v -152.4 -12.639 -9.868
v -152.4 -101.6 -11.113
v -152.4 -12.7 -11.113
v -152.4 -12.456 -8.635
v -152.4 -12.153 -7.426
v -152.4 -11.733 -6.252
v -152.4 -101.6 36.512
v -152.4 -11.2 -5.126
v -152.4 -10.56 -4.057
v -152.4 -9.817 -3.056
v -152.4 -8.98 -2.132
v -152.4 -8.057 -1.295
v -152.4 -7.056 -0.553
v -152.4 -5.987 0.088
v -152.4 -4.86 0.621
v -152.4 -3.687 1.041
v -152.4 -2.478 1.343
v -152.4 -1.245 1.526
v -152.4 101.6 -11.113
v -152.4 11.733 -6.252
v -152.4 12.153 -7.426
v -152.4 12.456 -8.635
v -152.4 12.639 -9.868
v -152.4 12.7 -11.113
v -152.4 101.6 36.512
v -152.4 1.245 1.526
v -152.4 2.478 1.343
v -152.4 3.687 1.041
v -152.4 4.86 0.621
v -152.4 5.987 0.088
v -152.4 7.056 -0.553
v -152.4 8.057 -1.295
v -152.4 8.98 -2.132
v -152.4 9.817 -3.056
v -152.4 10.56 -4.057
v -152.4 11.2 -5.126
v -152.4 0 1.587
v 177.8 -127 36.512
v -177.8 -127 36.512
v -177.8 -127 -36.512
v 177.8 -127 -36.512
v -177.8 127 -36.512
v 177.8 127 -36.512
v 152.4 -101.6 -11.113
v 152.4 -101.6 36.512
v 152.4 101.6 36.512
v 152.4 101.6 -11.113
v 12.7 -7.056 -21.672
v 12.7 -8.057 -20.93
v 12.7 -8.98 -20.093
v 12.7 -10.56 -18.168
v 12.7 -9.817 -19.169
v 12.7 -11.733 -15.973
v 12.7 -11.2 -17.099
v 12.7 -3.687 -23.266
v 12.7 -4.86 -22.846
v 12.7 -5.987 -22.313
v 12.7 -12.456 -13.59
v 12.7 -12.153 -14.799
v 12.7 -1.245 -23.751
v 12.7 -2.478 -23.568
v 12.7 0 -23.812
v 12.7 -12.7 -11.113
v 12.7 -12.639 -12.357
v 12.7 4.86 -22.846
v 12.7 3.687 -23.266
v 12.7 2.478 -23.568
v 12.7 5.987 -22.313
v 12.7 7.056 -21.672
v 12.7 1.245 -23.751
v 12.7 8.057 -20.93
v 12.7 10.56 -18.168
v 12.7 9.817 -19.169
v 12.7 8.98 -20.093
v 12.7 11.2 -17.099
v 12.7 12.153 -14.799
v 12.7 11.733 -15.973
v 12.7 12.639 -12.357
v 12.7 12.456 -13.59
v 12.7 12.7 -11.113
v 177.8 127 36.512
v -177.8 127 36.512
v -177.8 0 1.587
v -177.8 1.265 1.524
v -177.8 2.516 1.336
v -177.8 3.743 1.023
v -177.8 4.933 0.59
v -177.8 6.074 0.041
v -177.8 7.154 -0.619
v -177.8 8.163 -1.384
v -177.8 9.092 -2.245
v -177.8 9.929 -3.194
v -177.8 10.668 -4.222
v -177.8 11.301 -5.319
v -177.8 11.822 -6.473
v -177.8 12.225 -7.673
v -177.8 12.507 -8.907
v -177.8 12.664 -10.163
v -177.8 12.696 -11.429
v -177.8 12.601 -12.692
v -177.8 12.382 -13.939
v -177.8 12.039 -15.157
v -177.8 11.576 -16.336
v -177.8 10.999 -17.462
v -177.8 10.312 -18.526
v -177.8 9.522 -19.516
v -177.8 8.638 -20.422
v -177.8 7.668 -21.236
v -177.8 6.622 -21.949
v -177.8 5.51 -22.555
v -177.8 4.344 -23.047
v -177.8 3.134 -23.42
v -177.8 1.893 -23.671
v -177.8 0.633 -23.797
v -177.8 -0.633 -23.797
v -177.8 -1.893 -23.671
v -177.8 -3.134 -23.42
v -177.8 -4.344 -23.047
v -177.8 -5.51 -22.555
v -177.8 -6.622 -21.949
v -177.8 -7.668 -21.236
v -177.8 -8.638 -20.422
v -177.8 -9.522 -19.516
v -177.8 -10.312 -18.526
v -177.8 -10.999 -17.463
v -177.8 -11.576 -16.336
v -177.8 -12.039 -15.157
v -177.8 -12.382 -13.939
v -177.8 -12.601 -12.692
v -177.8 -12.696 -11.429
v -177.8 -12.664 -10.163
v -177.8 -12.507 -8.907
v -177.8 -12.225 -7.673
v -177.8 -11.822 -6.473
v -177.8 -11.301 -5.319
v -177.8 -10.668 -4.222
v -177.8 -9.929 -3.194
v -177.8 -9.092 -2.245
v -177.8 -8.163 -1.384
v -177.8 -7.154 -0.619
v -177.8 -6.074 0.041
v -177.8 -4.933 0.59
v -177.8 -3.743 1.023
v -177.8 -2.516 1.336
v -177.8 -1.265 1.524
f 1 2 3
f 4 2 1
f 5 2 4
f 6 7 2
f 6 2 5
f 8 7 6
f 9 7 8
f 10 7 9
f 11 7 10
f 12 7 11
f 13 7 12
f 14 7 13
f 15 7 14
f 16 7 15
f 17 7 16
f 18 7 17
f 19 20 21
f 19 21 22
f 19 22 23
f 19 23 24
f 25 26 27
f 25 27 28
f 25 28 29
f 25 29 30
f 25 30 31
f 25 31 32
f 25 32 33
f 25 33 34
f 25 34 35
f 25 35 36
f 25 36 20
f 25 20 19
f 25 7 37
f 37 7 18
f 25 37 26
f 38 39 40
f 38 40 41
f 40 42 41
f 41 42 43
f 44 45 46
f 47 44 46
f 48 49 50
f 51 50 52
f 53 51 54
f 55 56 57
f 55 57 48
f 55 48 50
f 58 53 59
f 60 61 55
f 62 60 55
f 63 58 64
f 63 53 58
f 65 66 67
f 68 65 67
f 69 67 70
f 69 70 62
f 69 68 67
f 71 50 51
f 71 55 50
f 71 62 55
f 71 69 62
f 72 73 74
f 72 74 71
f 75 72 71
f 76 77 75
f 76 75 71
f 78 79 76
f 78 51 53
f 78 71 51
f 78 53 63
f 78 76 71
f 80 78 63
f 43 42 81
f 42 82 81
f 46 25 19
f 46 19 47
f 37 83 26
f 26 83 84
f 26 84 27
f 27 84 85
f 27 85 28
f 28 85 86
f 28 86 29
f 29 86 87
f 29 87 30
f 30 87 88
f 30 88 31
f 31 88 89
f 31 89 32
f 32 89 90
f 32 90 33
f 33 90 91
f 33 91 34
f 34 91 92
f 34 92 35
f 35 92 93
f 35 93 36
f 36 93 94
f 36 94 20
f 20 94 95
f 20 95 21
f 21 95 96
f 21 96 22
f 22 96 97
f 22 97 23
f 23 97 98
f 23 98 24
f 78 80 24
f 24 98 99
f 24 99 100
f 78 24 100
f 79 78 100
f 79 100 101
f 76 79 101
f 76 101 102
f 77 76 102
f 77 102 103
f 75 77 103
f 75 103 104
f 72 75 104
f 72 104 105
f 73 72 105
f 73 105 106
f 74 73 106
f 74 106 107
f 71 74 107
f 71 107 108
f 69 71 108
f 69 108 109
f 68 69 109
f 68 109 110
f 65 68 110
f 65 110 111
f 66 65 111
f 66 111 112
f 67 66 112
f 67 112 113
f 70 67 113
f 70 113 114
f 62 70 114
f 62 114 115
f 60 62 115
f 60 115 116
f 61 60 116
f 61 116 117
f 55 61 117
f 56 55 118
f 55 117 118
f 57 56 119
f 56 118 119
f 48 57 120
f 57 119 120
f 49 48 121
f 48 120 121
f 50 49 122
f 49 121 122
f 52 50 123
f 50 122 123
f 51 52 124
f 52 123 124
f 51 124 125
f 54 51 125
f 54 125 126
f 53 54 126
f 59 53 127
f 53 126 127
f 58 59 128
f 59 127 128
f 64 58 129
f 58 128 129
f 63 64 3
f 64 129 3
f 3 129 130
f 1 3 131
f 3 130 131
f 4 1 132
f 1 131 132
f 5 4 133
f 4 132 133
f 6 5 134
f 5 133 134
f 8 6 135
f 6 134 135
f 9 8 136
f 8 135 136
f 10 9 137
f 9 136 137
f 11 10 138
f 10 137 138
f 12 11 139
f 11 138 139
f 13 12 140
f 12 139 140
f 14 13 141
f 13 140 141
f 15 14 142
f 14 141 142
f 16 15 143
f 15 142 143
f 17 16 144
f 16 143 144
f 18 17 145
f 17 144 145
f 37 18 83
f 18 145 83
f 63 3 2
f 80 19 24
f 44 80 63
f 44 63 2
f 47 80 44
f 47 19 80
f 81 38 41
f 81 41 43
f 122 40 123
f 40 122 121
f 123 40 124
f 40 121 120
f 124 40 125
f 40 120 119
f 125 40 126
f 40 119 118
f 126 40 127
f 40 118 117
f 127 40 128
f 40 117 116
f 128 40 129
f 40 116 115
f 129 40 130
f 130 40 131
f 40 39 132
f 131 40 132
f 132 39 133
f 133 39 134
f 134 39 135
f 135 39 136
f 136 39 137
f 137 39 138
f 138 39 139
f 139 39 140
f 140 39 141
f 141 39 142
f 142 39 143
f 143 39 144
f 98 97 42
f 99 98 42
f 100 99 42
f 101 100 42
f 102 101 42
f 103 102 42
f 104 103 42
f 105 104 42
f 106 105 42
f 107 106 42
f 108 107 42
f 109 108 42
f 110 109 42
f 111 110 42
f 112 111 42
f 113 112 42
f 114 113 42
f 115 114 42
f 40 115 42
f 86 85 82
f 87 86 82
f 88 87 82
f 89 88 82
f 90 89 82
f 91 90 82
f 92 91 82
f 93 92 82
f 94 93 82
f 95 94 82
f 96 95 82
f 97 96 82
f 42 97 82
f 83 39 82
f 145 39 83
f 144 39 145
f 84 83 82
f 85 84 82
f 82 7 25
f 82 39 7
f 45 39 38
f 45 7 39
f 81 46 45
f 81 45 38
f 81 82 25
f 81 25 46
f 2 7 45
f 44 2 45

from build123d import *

# Parameters (mm, degrees)
SKETCH1_W           = 355.6
SKETCH1_H           = 254
BOSS_EXTRUDE1_DEPTH = 36.5125
SHELL1_T            = -25.4
SKETCH2_R           = 12.7
CUT_EXTRUDE1_DEPTH  = 190.5


with BuildPart() as part:
    # Sketch1 → Boss-Extrude1 (new body, symmetric)
    with BuildSketch(Plane.XY):
        Rectangle(SKETCH1_W, SKETCH1_H)
    extrude(amount=BOSS_EXTRUDE1_DEPTH, both=True)

    # Shell1
    shell1_openings = [part.faces().sort_by_distance(p)[0] for p in [
        (0, 0, 36.5125),
    ]]
    offset(amount=SHELL1_T, openings=shell1_openings, kind=Kind.INTERSECTION)

    # Sketch2 → Cut-Extrude1 (cut)
    with BuildSketch(Plane.ZY.offset(177.8)):
        with Locations((-11.1125, 0)):
            Circle(SKETCH2_R)
    extrude(amount=-CUT_EXTRUDE1_DEPTH, mode=Mode.SUBTRACT)


solid = part.part
